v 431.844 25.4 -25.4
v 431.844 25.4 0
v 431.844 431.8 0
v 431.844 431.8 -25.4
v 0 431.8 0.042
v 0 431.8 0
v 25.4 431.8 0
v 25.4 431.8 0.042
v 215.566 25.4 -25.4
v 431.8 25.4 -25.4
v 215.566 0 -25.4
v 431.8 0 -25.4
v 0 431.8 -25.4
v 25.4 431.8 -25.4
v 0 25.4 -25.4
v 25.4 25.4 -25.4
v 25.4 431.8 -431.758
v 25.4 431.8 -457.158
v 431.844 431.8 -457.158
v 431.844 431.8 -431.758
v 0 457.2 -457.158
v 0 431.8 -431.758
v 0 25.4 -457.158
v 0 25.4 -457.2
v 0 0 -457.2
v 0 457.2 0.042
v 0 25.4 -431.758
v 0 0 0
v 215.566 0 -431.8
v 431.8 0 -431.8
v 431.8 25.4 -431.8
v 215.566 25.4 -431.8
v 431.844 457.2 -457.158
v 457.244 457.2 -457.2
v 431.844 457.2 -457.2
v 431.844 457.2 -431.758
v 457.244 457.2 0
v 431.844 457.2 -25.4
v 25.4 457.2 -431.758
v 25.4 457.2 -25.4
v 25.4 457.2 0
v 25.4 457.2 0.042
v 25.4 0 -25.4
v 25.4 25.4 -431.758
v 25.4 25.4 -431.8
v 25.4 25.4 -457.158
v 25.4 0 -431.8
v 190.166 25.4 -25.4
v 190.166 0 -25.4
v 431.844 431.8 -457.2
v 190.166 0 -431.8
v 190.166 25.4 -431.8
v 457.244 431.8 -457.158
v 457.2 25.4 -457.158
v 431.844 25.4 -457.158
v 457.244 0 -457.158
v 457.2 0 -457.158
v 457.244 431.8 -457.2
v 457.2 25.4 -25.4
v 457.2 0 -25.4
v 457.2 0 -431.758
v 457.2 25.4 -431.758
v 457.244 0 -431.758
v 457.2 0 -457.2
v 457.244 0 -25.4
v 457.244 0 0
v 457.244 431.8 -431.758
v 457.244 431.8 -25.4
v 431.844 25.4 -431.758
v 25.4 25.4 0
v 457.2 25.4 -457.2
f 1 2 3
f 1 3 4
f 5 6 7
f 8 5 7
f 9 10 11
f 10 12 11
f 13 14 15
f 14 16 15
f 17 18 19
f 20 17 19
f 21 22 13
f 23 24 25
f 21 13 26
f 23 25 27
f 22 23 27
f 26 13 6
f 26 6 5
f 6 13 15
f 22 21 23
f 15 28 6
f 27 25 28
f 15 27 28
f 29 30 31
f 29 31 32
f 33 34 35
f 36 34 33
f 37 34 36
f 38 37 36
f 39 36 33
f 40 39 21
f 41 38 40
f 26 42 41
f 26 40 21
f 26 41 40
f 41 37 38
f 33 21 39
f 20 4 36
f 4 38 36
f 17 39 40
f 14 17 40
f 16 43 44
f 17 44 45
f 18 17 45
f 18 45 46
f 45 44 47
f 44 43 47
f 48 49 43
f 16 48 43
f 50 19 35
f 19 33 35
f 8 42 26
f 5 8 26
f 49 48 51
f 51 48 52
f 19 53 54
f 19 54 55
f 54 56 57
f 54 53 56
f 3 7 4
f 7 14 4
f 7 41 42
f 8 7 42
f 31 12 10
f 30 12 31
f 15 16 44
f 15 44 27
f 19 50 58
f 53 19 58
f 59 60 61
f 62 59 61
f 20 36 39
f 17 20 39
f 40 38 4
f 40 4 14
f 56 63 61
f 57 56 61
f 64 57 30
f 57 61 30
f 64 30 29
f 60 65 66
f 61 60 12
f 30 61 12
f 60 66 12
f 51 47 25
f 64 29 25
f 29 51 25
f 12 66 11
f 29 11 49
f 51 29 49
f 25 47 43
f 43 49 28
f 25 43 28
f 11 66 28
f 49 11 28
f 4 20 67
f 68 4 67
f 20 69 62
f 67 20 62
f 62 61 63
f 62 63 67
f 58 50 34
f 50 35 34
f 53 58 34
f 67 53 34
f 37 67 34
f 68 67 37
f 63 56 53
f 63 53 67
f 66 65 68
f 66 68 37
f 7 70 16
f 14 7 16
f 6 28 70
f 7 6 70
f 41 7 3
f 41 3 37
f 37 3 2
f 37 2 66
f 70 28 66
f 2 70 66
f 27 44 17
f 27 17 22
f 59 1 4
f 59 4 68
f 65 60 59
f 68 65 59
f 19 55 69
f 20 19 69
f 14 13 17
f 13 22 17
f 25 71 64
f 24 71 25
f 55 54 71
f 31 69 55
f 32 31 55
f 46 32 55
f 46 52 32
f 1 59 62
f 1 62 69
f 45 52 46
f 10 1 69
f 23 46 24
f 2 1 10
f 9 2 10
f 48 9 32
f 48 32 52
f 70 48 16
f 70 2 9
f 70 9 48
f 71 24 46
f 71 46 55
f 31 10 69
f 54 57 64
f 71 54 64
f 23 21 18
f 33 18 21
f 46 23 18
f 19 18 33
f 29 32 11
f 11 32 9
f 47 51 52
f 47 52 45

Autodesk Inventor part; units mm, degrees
ref_plane "YZ Plane" through (0, 0, 0) normal (1, 0, 0) x (0, 1, 0)
ref_plane "XZ Plane" through (0, 0, 0) normal (0, 1, 0) x (-1, 0, 0)
ref_plane "XY Plane" through (0, 0, 0) normal (0, 0, 1) x (1, 0, 0)
sketch "Sketch1" plane through (0, 0, 0) normal (0, 1, 0) x (-1, 0, 0)
  line L0 (0, 0) -> (-457.2, 0)
  line L1 (-457.2, 0) -> (-457.2, -25.4)
  line L2 (-457.2, -25.4) -> (0, -25.4)
  line L3 (0, -25.4) -> (0, 0)
  line L4 (0, 0) -> (-25.4, 0)
  line L5 (-25.4, 0) -> (-25.4, -457.2)
  line L6 (-25.4, -457.2) -> (0, -457.2)
  line L7 (0, -457.2) -> (0, 0)
  line L8 (0, -457.2) -> (-457.2, -457.2)
  line L9 (-457.2, -457.2) -> (-457.2, -431.8)
  line L10 (-457.2, -431.8) -> (0, -431.8)
  line L11 (0, -431.8) -> (0, -457.2)
  line L12 (-457.2, 0) -> (-431.8, 0)
  line L13 (-431.8, 0) -> (-431.8, -457.2)
  line L14 (-431.8, -457.2) -> (-457.2, -457.2)
  line L15 (-457.2, -457.2) -> (-457.2, 0)
  dimension "d0" = 457.2
  dimension "d1" = 25.4
  dimension "d2" = 25.4
  dimension "d3" = 457.2
  dimension "d4" = 457.2
  dimension "d5" = 25.4
  dimension "d6" = 25.4
sketch "Sketch2" plane through (0, 0, 0) normal (0, 1, 0) x (-1, 0, 0)
  line L0 (0, 0) -> (-25.4, 0)
  line L1 (-25.4, 0) -> (-25.4, -25.4)
  line L2 (-25.4, -25.4) -> (0, -25.4)
  line L3 (0, -25.4) -> (0, 0)
  line L4 (0, -457.1579) -> (-25.4, -457.1579)
  line L5 (-25.4, -457.1579) -> (-25.4, -431.7579)
  line L6 (-25.4, -431.7579) -> (0, -431.7579)
  line L7 (0, -431.7579) -> (0, -457.1579)
  line L8 (-457.244, -457.1579) -> (-431.844, -457.1579)
  line L9 (-431.844, -457.1579) -> (-431.844, -431.7579)
  line L10 (-431.844, -431.7579) -> (-457.244, -431.7579)
  line L11 (-457.244, -431.7579) -> (-457.244, -457.1579)
  line L12 (-457.244, 0) -> (-431.844, 0)
  line L13 (-431.844, 0) -> (-431.844, -25.4)
  line L14 (-431.844, -25.4) -> (-457.244, -25.4)
  line L15 (-457.244, -25.4) -> (-457.244, 0)
  dimension "d7" = 25.4
  dimension "d8" = 25.4
  dimension "d9" = 25.4
  dimension "d10" = 25.4
  dimension "d11" = 25.4
  dimension "d12" = 25.4
  dimension "d13" = 25.4
  dimension "d14" = 25.4
sketch "Sketch3" plane through (0, 0, 0) normal (0, 0, 1) x (1, 0, 0)
  point P0 (0, 0)
sketch "Sketch4" plane through (0, 0, 0) normal (0, 0, 1) x (1, 0, 0)
  point P0 (0, 0)
extrude "Extrusion1" add sketch "Sketch1" along normal blind 25.4 contours L3 L2 L5 L0 | L5 L2 L13 L0 | L7 L10 L5 L2 | L13 L2 L1 L0 | L7 L6 L5 L10 | L13 L10 L15 L2 | L5 L8 L13 L10 | L13 L8 L9 L10
extrude "Extrusion2" add sketch "Sketch2" along normal blind 457.2
sketch "Sketch5" plane through (0, 457.2, 0) normal (0, 1, 0) x (1, 0, 0)
  line L0 (0, 0) -> (25.4, 0)
  line L1 (25.4, 0) -> (25.4, 25.4)
  line L2 (25.4, 25.4) -> (0, 25.4)
  line L3 (0, 25.4) -> (0, 0)
  line L4 (0, 457.1579) -> (25.4, 457.1579)
  line L5 (25.4, 457.1579) -> (25.4, -0.0421)
  line L6 (25.4, -0.0421) -> (0, -0.0421)
  line L7 (0, -0.0421) -> (0, 457.1579)
  line L8 (457.244, 25.4) -> (431.844, 25.4) projected
  line L9 (0, 0) -> (457.2, 0)
  line L10 (457.2, 0) -> (457.2, 25.4)
  line L11 (457.2, 25.4) -> (0, 25.4)
  line L12 (0, 25.4) -> (0, 0)
  line L13 (431.844, 431.7579) -> (457.244, 431.7579) projected
  line L14 (0, 457.1579) -> (457.2, 457.1579)
  line L15 (457.2, 457.1579) -> (457.2, 431.7579)
  line L16 (457.2, 431.7579) -> (0, 431.7579)
  line L17 (0, 431.7579) -> (0, 457.1579)
  line L18 (457.244, 0) -> (431.844, 0)
  line L19 (431.844, 0) -> (431.844, 457.2)
  line L20 (431.844, 457.2) -> (457.244, 457.2)
  line L21 (457.244, 457.2) -> (457.244, 0)
  dimension "d19" = 25.4
  dimension "d20" = 457.2
  dimension "d21" = 457.2
  dimension "d22" = 457.2
  dimension "d23" = 25.4
  dimension "d24" = 457.2
extrude "Extrusion3" add sketch "Sketch5" against normal blind 25.4 contours L3 L2 L1 L0 | L0 L5 L6 L7 | L1 L11 L19 L9 | L7 L16 L5 L2 | L19 L8 L10 L9 | L7 L4 L5 L16 | L5 L14 L19 L16 | L19 L13 L21 L8 | L10 L8 L21 L18 | L19 L14 L15 L13 | L19 L20 L21 L13 L15 L14
sketch "Sketch6" plane through (457.244, 0, 0) normal (1, 0, 0) x (0, 0, -1)
  point P0 (0, 0)
sketch "Sketch7" plane through (0, 25.4, 0) normal (0, 1, 0) x (1, 0, 0)
  line L0 (457.2, 457.2) -> (0, 457.2) projected
  line L1 (190.1658, 457.2) -> (215.5658, 457.2)
  line L2 (215.5658, 457.2) -> (215.5658, 0)
  line L3 (215.5658, 0) -> (190.1658, 0)
  line L4 (190.1658, 0) -> (190.1658, 457.2)
  point P0 (0, 0)
  dimension "d27" = 25.4
  dimension "d28" = 457.2
extrude "Extrusion4" add sketch "Sketch7" against normal blind 25.4
sketch "Sketch8" plane through (0, 25.4, 0) normal (0, 1, 0) x (1, 0, 0)
  line L0 (190.1658, 431.8) -> (215.5658, 431.8)
  line L1 (215.5658, 431.8) -> (215.5658, 25.4) projected
  line L2 (190.1658, 25.4) -> (215.5658, 25.4)
  line L3 (190.1658, 25.4) -> (190.1658, 431.8) projected
  point P0 (0, 0)
properties part number "Basic Frame" material "Aluminum 6061, Welded"
